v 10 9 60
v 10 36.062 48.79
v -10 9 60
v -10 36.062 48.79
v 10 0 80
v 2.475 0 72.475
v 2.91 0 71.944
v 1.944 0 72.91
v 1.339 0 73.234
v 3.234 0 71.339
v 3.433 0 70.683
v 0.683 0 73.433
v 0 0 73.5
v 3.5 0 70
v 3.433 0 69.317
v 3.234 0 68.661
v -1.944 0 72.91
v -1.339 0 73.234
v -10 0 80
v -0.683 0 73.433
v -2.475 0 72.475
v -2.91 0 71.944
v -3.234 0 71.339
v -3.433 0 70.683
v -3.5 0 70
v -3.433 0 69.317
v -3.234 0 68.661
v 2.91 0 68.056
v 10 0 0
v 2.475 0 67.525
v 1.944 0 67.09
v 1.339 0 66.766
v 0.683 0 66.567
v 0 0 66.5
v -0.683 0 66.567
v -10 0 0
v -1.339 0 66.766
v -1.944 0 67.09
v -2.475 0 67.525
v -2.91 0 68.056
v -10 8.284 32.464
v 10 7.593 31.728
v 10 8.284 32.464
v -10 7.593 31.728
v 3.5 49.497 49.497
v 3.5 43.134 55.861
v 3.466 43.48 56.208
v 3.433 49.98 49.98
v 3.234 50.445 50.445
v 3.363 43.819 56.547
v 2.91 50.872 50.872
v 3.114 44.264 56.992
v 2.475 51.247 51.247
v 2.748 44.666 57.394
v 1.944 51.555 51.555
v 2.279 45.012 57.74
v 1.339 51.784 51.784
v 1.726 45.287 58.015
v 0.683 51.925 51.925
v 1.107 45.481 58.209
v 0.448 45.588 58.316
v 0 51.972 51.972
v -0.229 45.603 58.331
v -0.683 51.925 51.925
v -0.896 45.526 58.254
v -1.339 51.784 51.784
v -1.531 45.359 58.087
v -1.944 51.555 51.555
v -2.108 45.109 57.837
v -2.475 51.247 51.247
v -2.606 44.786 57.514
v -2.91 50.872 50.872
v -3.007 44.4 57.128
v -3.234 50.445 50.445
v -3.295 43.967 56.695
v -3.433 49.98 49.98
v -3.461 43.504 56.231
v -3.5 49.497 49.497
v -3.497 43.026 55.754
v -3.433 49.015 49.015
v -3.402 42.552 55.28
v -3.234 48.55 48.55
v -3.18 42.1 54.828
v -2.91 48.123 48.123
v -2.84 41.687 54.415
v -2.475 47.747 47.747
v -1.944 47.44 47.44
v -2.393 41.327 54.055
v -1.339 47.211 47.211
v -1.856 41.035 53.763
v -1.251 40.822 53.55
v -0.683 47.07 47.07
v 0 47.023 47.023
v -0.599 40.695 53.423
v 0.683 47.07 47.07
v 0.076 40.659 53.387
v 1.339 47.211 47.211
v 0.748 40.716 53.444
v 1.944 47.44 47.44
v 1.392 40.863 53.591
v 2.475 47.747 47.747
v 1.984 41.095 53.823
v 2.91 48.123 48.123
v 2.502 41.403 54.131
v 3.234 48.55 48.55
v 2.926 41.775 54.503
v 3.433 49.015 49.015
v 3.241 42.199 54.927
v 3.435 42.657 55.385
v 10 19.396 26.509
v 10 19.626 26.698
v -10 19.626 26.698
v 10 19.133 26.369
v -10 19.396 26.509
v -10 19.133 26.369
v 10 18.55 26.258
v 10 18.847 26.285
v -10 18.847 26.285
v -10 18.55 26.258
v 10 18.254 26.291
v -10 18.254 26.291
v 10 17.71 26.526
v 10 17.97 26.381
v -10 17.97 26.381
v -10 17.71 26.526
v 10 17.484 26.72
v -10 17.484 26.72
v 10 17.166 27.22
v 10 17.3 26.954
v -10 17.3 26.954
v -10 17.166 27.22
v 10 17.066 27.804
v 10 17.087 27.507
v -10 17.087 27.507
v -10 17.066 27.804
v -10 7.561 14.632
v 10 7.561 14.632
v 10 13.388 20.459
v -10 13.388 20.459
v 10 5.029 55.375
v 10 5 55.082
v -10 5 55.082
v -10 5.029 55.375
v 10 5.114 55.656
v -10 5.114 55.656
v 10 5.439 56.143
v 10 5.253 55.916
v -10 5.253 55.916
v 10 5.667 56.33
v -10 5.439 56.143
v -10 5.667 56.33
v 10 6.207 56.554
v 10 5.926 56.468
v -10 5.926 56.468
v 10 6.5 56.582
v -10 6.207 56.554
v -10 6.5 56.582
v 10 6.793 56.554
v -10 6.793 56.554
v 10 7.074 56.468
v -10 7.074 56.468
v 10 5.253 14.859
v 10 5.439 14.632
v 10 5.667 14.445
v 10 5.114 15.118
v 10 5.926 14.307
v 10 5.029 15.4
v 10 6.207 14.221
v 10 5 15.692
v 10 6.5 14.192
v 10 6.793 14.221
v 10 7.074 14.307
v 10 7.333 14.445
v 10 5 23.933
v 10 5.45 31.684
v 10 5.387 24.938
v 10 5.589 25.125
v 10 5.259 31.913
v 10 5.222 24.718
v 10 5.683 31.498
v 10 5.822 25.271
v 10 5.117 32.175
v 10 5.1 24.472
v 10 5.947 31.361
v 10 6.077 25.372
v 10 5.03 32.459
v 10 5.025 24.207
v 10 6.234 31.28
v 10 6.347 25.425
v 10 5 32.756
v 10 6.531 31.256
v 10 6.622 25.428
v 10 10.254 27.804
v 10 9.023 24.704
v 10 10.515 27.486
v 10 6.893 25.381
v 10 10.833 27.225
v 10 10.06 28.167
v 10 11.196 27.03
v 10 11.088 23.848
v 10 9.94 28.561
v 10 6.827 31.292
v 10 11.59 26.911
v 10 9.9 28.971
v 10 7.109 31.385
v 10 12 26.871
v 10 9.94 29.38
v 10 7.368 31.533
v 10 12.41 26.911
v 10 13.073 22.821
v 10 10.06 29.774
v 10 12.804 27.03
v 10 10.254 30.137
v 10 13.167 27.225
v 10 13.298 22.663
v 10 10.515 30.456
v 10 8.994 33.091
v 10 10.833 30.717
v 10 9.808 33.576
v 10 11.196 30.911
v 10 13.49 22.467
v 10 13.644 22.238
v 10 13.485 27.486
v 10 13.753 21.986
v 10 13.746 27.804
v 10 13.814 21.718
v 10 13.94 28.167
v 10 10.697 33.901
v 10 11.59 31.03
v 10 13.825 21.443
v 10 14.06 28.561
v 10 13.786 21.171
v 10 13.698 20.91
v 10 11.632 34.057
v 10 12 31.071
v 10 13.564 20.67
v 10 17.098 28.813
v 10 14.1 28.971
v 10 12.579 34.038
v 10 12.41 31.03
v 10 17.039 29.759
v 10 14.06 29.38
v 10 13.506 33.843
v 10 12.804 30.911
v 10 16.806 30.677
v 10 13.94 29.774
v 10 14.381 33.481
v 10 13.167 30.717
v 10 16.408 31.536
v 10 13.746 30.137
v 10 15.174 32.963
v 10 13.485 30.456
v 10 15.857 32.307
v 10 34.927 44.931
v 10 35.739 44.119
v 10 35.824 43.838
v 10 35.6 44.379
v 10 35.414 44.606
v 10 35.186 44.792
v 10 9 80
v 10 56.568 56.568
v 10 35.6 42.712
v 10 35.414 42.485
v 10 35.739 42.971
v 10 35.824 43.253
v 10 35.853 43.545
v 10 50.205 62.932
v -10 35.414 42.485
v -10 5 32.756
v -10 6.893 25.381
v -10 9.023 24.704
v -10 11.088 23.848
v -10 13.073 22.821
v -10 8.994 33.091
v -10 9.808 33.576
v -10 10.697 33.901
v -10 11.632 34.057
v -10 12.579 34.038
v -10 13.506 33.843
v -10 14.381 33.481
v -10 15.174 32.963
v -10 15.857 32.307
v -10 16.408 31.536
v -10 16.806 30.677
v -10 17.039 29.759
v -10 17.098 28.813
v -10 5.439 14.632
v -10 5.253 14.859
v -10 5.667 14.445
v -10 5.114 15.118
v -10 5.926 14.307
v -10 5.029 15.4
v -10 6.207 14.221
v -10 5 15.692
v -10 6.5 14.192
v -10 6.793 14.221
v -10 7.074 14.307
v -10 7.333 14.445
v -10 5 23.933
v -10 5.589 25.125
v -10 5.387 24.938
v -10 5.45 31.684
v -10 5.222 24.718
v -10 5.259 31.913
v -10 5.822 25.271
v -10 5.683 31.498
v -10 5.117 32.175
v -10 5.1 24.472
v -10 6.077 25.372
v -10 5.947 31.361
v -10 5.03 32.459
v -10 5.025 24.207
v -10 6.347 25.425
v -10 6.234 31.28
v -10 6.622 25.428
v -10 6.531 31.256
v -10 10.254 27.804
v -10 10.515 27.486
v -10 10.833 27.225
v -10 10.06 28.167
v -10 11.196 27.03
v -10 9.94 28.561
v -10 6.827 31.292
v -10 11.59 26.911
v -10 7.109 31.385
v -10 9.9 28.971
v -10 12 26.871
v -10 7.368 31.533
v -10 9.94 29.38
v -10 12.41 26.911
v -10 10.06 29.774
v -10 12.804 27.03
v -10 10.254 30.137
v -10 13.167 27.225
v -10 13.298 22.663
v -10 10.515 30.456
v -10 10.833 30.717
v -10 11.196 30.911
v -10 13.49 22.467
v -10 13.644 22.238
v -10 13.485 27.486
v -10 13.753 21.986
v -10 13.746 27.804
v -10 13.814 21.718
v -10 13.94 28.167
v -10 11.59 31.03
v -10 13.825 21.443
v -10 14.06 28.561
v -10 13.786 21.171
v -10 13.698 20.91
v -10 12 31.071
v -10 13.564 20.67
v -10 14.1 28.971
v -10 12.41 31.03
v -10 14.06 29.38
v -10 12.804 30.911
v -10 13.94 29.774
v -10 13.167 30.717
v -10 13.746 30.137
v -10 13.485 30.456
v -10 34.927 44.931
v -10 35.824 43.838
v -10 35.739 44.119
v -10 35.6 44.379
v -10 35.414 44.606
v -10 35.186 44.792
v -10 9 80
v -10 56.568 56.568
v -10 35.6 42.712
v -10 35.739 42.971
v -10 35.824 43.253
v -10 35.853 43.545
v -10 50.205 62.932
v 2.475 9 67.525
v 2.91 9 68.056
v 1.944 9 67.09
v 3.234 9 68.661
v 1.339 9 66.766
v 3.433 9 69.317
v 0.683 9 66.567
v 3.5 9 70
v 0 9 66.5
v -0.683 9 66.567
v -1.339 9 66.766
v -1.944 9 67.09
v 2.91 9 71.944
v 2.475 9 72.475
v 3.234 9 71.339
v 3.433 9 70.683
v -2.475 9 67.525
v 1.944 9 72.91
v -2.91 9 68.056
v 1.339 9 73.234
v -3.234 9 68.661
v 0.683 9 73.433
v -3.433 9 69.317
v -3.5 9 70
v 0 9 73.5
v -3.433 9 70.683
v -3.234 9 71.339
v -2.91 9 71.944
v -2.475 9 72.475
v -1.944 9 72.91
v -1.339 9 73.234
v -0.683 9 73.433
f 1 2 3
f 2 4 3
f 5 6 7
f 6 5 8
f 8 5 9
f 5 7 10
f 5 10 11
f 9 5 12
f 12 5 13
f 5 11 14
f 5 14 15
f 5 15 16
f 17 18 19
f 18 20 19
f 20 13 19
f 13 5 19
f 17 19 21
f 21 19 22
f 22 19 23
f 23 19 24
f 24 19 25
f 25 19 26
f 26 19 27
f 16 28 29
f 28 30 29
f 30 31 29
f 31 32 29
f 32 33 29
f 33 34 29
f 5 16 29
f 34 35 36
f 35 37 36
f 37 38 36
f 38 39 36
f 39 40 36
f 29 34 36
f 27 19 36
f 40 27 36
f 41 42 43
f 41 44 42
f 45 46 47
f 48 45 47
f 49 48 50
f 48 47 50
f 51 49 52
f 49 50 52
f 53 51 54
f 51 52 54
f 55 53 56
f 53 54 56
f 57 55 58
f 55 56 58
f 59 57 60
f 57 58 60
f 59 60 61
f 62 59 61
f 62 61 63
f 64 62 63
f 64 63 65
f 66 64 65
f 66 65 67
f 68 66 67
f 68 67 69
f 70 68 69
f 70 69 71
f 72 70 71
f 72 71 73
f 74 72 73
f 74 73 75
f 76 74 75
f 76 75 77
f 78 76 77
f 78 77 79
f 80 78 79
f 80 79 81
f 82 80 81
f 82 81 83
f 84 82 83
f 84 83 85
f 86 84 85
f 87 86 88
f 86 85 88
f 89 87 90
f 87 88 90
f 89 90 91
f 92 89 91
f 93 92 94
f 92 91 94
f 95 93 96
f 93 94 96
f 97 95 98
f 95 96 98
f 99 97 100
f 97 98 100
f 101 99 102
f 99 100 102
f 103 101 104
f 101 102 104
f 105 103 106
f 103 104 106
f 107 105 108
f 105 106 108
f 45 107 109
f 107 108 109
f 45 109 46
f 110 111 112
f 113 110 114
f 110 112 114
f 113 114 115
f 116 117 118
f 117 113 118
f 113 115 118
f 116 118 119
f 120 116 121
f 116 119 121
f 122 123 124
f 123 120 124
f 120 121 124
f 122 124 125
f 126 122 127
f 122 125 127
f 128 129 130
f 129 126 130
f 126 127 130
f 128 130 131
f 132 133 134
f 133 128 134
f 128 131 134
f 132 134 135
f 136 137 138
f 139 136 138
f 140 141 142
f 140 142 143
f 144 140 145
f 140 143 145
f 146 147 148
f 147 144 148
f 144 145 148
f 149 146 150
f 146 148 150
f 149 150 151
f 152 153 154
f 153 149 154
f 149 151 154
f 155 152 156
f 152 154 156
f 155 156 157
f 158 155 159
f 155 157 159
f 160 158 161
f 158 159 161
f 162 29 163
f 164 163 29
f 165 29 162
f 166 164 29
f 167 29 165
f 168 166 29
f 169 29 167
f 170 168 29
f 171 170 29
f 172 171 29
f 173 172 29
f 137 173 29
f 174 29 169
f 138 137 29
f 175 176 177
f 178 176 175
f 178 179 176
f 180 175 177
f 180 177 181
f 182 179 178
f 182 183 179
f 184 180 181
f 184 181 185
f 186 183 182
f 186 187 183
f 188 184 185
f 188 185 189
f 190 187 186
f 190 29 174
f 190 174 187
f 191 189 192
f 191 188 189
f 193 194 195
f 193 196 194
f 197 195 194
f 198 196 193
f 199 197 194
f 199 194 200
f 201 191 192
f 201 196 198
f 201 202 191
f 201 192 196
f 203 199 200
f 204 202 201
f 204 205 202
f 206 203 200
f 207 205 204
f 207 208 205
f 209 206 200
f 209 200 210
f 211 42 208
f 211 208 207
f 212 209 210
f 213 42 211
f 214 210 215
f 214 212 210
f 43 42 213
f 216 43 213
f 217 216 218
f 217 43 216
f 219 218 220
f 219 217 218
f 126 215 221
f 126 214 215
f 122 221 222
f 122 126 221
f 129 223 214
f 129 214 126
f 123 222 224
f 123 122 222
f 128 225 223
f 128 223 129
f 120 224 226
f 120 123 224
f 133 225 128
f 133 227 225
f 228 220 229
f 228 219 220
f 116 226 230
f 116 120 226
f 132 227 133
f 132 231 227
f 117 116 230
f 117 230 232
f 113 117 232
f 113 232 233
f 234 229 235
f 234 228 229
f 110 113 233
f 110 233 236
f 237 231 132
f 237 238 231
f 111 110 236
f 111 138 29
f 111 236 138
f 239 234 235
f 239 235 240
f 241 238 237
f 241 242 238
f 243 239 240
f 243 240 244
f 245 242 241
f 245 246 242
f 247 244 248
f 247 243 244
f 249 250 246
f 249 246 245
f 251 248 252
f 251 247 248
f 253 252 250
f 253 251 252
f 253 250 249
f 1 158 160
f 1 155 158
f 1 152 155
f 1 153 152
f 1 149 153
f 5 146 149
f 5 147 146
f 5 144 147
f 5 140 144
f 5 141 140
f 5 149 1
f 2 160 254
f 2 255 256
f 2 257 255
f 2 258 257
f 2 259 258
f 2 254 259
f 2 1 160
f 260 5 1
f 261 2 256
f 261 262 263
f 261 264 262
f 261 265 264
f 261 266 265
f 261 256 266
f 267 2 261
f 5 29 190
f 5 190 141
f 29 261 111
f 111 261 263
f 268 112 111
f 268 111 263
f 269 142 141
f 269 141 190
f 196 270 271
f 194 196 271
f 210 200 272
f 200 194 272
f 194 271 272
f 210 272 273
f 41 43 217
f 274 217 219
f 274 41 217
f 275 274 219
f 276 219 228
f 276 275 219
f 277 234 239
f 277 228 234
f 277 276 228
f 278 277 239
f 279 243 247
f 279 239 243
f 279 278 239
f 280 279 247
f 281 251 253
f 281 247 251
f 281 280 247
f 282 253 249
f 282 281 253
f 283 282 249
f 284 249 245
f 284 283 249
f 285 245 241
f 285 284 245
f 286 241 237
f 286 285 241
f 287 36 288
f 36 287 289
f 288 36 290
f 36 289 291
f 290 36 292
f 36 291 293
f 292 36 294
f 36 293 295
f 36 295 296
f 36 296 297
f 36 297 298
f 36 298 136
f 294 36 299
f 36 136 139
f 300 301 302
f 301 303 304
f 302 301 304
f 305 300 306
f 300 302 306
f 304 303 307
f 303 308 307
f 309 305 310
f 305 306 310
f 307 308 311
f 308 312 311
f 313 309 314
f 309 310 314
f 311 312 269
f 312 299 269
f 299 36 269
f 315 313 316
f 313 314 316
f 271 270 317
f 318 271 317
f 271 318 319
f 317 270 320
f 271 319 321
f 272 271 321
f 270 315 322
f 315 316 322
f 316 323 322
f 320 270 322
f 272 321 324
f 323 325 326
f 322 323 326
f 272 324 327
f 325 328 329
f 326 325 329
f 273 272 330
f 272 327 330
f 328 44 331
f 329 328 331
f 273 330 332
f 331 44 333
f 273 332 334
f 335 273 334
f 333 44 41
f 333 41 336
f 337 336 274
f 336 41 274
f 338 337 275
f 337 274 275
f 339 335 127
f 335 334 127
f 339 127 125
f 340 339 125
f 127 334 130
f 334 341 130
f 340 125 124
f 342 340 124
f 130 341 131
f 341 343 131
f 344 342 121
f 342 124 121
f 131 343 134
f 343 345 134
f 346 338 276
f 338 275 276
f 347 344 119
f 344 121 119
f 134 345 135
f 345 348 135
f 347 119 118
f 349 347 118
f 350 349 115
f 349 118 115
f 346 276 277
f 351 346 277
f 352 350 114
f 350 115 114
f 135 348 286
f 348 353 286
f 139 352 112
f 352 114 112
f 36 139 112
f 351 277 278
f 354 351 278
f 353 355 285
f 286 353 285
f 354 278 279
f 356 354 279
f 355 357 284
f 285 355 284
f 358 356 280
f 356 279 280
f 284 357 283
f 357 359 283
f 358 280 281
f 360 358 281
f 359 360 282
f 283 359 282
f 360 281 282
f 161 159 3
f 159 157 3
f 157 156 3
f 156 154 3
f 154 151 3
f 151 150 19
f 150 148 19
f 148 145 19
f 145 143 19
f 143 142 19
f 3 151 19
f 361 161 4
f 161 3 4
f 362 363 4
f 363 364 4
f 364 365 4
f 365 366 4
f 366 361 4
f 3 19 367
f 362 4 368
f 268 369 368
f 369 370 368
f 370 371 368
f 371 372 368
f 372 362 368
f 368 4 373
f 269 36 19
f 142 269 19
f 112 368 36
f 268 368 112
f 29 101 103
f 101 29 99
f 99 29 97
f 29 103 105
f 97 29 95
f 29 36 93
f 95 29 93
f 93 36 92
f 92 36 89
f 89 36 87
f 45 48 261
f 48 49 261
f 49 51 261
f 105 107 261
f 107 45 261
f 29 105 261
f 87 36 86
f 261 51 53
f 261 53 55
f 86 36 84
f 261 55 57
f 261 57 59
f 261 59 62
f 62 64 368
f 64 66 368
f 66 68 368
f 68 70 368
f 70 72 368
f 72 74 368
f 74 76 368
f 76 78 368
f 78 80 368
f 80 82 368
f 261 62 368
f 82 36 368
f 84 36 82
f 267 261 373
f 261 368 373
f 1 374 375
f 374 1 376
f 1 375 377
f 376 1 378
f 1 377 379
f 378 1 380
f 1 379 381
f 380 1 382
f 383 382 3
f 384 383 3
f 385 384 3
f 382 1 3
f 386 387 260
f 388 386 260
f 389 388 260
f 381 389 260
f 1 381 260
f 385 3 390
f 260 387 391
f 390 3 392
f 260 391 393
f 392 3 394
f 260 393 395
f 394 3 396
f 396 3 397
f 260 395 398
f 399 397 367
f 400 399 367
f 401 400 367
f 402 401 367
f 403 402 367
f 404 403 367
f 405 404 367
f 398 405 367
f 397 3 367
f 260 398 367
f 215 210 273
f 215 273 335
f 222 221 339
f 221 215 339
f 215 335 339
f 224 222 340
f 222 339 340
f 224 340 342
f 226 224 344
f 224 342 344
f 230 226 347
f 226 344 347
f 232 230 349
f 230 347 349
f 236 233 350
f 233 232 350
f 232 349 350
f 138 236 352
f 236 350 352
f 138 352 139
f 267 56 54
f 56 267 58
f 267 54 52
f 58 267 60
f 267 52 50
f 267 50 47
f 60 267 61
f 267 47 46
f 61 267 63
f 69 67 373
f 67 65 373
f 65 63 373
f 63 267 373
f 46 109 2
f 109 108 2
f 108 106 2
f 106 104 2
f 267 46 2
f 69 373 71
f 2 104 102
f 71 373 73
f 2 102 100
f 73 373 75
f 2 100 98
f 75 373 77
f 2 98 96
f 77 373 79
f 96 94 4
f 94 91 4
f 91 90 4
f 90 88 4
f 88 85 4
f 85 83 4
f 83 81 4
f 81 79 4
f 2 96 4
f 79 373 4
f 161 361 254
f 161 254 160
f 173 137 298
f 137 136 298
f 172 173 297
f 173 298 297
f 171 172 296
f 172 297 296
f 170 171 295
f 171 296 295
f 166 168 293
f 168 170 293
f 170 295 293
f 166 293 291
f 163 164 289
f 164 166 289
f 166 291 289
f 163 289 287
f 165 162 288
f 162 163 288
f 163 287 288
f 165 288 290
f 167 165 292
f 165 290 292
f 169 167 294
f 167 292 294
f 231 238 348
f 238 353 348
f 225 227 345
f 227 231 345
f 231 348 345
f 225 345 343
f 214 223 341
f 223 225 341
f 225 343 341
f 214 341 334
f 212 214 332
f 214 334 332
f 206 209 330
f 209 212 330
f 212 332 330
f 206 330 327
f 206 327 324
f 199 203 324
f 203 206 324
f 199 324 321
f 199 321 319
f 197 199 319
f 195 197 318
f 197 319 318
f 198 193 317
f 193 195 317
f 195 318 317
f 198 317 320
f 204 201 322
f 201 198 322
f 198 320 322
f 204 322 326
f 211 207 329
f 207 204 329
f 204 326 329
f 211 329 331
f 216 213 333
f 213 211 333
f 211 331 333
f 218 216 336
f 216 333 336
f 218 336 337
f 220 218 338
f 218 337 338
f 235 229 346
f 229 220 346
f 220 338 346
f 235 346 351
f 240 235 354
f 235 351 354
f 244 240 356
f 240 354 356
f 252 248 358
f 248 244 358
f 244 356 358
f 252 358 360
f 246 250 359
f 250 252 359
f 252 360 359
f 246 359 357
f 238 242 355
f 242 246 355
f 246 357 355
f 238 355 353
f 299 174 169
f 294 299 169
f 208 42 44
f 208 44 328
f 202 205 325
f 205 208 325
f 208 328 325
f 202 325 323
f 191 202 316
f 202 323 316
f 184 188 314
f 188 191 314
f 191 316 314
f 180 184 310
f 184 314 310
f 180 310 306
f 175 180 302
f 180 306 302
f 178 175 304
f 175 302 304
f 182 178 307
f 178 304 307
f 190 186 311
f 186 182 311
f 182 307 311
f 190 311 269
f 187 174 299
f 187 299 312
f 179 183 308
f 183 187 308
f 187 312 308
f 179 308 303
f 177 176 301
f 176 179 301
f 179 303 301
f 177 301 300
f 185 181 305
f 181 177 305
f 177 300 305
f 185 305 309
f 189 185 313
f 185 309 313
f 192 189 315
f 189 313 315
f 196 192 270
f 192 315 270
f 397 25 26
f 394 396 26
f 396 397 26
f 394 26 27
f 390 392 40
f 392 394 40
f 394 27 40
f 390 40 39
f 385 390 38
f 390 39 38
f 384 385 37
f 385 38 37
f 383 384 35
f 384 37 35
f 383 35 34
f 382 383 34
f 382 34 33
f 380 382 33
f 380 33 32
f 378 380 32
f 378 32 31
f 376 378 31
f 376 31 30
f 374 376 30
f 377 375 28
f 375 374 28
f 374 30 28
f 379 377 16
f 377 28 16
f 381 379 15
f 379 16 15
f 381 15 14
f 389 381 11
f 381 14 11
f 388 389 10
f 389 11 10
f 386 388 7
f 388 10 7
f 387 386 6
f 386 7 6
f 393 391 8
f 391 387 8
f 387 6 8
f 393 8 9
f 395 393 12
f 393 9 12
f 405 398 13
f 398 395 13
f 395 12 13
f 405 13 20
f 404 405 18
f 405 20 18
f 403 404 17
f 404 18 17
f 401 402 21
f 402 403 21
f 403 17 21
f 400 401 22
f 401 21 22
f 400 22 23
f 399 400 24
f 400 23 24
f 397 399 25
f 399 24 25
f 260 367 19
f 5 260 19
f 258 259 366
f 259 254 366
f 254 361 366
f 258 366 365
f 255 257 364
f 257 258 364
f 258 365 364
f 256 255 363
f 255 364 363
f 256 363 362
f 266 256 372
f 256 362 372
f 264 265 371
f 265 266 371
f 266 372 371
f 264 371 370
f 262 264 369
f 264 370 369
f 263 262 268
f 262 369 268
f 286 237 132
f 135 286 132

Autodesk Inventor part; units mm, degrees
sketch "Sketch_1" plane through (0, 0, 0) normal (1, 0, 0) x (0, 1, 0)
  line L0 (0, 80) -> (0, 0)
  line L1 (0, 0) -> (56.5685, 56.5685)
  line L2 (56.5685, 56.5685) -> (50.2046, 62.9325)
  line L3 (50.2046, 62.9325) -> (36.0624, 48.7904)
  line L4 (36.0624, 48.7904) -> (9, 60)
  line L5 (9, 60) -> (9, 80)
  line L6 (9, 80) -> (0, 80)
  arc A0 (6.8931, 25.3806) -> (5, 23.933) centre (6.5, 23.933) ccw
  line L7 (5, 23.933) -> (5, 15.6924)
  arc A1 (5, 15.6924) -> (7.5607, 14.6317) centre (6.5, 15.6924) ccw
  line L8 (7.5607, 14.6317) -> (13.3877, 20.4587)
  arc A2 (13.3877, 20.4587) -> (13.0726, 22.821) centre (12.327, 21.5194) ccw
  arc A3 (13.0726, 22.821) -> (6.8931, 25.3806) centre (0, 0) ccw
  circle A4 centre (12, 28.9706) radius 2.1
  arc A5 (7.074, 56.4682) -> (5, 55.0824) centre (6.5, 55.0824) ccw
  line L9 (5, 55.0824) -> (5, 32.7559)
  arc A6 (5, 32.7559) -> (7.5929, 31.7285) centre (6.5, 32.7559) ccw
  line L10 (7.5929, 31.7285) -> (8.2843, 32.4639)
  arc A7 (17.0976, 28.8133) -> (8.2843, 32.4639) centre (12, 28.9706) ccw
  line L11 (17.0976, 28.8133) -> (17.0665, 27.8044)
  arc A8 (17.0665, 27.8044) -> (19.6264, 26.6975) centre (18.5657, 27.7581) ccw
  line L12 (19.6264, 26.6975) -> (35.4136, 42.4847)
  arc A9 (35.4136, 42.4847) -> (34.927, 44.9311) centre (34.3529, 43.5453) ccw
  line L13 (34.927, 44.9311) -> (7.074, 56.4682)
extrude "Extrusion1" add sketch "Sketch_1" along normal mid plane 20
sketch "Sketch_2" plane through (-10, 50.2046, 62.9325) normal (0, -0.7071, 0.7071) x (1, 0, 0)
  circle A0 centre (10, -10) radius 3.5
extrude "Extrusion2" cut sketch "Sketch_2" against normal blind 9
sketch "Sketch_3" plane through (0, 0, 0) normal (0, 1, 0) x (-1, 0, 0)
  circle A0 centre (0, 70) radius 3.5
extrude "Extrusion3" cut sketch "Sketch_3" along normal blind 9
ref_plane "bracket_to_dummy_XY" through (0, 0, 0) normal (0, 1, 0) x (1, 0, 0)
ref_plane "bracket_to_dummy_YZ" through (0, 0, 0) normal (1, 0, 0) x (0, 0, -1)
ref_plane "bracket_to_dummy_ZX" through (0, 0, 0) normal (0, 0, -1) x (0, 1, 0)
ref_plane "1_to_bolt_XY" through (0, 9, 70) normal (0, 1, 0) x (1, 0, 0)
ref_plane "1_to_bolt_YZ" through (0, 9, 70) normal (1, 0, 0) x (0, 0, -1)
ref_plane "1_to_bolt_ZX" through (0, 9, 70) normal (0, 0, -1) x (0, 1, 0)
ref_plane "2_to_bolt_XY" through (0, 43.1335, 55.8614) normal (0, -0.7071, 0.7071) x (0, 0.7071, 0.7071)
ref_plane "2_to_bolt_YZ" through (0, 43.1335, 55.8614) normal (0, 0.7071, 0.7071) x (-1, 0, 0)
ref_plane "2_to_bolt_ZX" through (0, 43.1335, 55.8614) normal (-1, 0, 0) x (0, -0.7071, 0.7071)
ref_plane "3_to_bolt_XY" through (0, 9, 70) normal (0, 1, 0) x (0, 0, -1)
ref_plane "3_to_bolt_YZ" through (0, 9, 70) normal (0, 0, -1) x (-1, 0, 0)
ref_plane "3_to_bolt_ZX" through (0, 9, 70) normal (-1, 0, 0) x (0, 1, 0)
ref_plane "4_to_bolt_XY" through (30, 9, 70) normal (0, 1, 0) x (0, 0, -1)
ref_plane "4_to_bolt_YZ" through (30, 9, 70) normal (0, 0, -1) x (-1, 0, 0)
ref_plane "4_to_bolt_ZX" through (30, 9, 70) normal (-1, 0, 0) x (0, 1, 0)
ref_plane "5_to_bolt_XY" through (30, 43.1335, 55.8614) normal (0, -0.7071, 0.7071) x (0, 0.7071, 0.7071)
ref_plane "5_to_bolt_YZ" through (30, 43.1335, 55.8614) normal (0, 0.7071, 0.7071) x (-1, 0, 0)
ref_plane "5_to_bolt_ZX" through (30, 43.1335, 55.8614) normal (-1, 0, 0) x (0, -0.7071, 0.7071)
properties part number "HBL45TS6hbl45ts6"
